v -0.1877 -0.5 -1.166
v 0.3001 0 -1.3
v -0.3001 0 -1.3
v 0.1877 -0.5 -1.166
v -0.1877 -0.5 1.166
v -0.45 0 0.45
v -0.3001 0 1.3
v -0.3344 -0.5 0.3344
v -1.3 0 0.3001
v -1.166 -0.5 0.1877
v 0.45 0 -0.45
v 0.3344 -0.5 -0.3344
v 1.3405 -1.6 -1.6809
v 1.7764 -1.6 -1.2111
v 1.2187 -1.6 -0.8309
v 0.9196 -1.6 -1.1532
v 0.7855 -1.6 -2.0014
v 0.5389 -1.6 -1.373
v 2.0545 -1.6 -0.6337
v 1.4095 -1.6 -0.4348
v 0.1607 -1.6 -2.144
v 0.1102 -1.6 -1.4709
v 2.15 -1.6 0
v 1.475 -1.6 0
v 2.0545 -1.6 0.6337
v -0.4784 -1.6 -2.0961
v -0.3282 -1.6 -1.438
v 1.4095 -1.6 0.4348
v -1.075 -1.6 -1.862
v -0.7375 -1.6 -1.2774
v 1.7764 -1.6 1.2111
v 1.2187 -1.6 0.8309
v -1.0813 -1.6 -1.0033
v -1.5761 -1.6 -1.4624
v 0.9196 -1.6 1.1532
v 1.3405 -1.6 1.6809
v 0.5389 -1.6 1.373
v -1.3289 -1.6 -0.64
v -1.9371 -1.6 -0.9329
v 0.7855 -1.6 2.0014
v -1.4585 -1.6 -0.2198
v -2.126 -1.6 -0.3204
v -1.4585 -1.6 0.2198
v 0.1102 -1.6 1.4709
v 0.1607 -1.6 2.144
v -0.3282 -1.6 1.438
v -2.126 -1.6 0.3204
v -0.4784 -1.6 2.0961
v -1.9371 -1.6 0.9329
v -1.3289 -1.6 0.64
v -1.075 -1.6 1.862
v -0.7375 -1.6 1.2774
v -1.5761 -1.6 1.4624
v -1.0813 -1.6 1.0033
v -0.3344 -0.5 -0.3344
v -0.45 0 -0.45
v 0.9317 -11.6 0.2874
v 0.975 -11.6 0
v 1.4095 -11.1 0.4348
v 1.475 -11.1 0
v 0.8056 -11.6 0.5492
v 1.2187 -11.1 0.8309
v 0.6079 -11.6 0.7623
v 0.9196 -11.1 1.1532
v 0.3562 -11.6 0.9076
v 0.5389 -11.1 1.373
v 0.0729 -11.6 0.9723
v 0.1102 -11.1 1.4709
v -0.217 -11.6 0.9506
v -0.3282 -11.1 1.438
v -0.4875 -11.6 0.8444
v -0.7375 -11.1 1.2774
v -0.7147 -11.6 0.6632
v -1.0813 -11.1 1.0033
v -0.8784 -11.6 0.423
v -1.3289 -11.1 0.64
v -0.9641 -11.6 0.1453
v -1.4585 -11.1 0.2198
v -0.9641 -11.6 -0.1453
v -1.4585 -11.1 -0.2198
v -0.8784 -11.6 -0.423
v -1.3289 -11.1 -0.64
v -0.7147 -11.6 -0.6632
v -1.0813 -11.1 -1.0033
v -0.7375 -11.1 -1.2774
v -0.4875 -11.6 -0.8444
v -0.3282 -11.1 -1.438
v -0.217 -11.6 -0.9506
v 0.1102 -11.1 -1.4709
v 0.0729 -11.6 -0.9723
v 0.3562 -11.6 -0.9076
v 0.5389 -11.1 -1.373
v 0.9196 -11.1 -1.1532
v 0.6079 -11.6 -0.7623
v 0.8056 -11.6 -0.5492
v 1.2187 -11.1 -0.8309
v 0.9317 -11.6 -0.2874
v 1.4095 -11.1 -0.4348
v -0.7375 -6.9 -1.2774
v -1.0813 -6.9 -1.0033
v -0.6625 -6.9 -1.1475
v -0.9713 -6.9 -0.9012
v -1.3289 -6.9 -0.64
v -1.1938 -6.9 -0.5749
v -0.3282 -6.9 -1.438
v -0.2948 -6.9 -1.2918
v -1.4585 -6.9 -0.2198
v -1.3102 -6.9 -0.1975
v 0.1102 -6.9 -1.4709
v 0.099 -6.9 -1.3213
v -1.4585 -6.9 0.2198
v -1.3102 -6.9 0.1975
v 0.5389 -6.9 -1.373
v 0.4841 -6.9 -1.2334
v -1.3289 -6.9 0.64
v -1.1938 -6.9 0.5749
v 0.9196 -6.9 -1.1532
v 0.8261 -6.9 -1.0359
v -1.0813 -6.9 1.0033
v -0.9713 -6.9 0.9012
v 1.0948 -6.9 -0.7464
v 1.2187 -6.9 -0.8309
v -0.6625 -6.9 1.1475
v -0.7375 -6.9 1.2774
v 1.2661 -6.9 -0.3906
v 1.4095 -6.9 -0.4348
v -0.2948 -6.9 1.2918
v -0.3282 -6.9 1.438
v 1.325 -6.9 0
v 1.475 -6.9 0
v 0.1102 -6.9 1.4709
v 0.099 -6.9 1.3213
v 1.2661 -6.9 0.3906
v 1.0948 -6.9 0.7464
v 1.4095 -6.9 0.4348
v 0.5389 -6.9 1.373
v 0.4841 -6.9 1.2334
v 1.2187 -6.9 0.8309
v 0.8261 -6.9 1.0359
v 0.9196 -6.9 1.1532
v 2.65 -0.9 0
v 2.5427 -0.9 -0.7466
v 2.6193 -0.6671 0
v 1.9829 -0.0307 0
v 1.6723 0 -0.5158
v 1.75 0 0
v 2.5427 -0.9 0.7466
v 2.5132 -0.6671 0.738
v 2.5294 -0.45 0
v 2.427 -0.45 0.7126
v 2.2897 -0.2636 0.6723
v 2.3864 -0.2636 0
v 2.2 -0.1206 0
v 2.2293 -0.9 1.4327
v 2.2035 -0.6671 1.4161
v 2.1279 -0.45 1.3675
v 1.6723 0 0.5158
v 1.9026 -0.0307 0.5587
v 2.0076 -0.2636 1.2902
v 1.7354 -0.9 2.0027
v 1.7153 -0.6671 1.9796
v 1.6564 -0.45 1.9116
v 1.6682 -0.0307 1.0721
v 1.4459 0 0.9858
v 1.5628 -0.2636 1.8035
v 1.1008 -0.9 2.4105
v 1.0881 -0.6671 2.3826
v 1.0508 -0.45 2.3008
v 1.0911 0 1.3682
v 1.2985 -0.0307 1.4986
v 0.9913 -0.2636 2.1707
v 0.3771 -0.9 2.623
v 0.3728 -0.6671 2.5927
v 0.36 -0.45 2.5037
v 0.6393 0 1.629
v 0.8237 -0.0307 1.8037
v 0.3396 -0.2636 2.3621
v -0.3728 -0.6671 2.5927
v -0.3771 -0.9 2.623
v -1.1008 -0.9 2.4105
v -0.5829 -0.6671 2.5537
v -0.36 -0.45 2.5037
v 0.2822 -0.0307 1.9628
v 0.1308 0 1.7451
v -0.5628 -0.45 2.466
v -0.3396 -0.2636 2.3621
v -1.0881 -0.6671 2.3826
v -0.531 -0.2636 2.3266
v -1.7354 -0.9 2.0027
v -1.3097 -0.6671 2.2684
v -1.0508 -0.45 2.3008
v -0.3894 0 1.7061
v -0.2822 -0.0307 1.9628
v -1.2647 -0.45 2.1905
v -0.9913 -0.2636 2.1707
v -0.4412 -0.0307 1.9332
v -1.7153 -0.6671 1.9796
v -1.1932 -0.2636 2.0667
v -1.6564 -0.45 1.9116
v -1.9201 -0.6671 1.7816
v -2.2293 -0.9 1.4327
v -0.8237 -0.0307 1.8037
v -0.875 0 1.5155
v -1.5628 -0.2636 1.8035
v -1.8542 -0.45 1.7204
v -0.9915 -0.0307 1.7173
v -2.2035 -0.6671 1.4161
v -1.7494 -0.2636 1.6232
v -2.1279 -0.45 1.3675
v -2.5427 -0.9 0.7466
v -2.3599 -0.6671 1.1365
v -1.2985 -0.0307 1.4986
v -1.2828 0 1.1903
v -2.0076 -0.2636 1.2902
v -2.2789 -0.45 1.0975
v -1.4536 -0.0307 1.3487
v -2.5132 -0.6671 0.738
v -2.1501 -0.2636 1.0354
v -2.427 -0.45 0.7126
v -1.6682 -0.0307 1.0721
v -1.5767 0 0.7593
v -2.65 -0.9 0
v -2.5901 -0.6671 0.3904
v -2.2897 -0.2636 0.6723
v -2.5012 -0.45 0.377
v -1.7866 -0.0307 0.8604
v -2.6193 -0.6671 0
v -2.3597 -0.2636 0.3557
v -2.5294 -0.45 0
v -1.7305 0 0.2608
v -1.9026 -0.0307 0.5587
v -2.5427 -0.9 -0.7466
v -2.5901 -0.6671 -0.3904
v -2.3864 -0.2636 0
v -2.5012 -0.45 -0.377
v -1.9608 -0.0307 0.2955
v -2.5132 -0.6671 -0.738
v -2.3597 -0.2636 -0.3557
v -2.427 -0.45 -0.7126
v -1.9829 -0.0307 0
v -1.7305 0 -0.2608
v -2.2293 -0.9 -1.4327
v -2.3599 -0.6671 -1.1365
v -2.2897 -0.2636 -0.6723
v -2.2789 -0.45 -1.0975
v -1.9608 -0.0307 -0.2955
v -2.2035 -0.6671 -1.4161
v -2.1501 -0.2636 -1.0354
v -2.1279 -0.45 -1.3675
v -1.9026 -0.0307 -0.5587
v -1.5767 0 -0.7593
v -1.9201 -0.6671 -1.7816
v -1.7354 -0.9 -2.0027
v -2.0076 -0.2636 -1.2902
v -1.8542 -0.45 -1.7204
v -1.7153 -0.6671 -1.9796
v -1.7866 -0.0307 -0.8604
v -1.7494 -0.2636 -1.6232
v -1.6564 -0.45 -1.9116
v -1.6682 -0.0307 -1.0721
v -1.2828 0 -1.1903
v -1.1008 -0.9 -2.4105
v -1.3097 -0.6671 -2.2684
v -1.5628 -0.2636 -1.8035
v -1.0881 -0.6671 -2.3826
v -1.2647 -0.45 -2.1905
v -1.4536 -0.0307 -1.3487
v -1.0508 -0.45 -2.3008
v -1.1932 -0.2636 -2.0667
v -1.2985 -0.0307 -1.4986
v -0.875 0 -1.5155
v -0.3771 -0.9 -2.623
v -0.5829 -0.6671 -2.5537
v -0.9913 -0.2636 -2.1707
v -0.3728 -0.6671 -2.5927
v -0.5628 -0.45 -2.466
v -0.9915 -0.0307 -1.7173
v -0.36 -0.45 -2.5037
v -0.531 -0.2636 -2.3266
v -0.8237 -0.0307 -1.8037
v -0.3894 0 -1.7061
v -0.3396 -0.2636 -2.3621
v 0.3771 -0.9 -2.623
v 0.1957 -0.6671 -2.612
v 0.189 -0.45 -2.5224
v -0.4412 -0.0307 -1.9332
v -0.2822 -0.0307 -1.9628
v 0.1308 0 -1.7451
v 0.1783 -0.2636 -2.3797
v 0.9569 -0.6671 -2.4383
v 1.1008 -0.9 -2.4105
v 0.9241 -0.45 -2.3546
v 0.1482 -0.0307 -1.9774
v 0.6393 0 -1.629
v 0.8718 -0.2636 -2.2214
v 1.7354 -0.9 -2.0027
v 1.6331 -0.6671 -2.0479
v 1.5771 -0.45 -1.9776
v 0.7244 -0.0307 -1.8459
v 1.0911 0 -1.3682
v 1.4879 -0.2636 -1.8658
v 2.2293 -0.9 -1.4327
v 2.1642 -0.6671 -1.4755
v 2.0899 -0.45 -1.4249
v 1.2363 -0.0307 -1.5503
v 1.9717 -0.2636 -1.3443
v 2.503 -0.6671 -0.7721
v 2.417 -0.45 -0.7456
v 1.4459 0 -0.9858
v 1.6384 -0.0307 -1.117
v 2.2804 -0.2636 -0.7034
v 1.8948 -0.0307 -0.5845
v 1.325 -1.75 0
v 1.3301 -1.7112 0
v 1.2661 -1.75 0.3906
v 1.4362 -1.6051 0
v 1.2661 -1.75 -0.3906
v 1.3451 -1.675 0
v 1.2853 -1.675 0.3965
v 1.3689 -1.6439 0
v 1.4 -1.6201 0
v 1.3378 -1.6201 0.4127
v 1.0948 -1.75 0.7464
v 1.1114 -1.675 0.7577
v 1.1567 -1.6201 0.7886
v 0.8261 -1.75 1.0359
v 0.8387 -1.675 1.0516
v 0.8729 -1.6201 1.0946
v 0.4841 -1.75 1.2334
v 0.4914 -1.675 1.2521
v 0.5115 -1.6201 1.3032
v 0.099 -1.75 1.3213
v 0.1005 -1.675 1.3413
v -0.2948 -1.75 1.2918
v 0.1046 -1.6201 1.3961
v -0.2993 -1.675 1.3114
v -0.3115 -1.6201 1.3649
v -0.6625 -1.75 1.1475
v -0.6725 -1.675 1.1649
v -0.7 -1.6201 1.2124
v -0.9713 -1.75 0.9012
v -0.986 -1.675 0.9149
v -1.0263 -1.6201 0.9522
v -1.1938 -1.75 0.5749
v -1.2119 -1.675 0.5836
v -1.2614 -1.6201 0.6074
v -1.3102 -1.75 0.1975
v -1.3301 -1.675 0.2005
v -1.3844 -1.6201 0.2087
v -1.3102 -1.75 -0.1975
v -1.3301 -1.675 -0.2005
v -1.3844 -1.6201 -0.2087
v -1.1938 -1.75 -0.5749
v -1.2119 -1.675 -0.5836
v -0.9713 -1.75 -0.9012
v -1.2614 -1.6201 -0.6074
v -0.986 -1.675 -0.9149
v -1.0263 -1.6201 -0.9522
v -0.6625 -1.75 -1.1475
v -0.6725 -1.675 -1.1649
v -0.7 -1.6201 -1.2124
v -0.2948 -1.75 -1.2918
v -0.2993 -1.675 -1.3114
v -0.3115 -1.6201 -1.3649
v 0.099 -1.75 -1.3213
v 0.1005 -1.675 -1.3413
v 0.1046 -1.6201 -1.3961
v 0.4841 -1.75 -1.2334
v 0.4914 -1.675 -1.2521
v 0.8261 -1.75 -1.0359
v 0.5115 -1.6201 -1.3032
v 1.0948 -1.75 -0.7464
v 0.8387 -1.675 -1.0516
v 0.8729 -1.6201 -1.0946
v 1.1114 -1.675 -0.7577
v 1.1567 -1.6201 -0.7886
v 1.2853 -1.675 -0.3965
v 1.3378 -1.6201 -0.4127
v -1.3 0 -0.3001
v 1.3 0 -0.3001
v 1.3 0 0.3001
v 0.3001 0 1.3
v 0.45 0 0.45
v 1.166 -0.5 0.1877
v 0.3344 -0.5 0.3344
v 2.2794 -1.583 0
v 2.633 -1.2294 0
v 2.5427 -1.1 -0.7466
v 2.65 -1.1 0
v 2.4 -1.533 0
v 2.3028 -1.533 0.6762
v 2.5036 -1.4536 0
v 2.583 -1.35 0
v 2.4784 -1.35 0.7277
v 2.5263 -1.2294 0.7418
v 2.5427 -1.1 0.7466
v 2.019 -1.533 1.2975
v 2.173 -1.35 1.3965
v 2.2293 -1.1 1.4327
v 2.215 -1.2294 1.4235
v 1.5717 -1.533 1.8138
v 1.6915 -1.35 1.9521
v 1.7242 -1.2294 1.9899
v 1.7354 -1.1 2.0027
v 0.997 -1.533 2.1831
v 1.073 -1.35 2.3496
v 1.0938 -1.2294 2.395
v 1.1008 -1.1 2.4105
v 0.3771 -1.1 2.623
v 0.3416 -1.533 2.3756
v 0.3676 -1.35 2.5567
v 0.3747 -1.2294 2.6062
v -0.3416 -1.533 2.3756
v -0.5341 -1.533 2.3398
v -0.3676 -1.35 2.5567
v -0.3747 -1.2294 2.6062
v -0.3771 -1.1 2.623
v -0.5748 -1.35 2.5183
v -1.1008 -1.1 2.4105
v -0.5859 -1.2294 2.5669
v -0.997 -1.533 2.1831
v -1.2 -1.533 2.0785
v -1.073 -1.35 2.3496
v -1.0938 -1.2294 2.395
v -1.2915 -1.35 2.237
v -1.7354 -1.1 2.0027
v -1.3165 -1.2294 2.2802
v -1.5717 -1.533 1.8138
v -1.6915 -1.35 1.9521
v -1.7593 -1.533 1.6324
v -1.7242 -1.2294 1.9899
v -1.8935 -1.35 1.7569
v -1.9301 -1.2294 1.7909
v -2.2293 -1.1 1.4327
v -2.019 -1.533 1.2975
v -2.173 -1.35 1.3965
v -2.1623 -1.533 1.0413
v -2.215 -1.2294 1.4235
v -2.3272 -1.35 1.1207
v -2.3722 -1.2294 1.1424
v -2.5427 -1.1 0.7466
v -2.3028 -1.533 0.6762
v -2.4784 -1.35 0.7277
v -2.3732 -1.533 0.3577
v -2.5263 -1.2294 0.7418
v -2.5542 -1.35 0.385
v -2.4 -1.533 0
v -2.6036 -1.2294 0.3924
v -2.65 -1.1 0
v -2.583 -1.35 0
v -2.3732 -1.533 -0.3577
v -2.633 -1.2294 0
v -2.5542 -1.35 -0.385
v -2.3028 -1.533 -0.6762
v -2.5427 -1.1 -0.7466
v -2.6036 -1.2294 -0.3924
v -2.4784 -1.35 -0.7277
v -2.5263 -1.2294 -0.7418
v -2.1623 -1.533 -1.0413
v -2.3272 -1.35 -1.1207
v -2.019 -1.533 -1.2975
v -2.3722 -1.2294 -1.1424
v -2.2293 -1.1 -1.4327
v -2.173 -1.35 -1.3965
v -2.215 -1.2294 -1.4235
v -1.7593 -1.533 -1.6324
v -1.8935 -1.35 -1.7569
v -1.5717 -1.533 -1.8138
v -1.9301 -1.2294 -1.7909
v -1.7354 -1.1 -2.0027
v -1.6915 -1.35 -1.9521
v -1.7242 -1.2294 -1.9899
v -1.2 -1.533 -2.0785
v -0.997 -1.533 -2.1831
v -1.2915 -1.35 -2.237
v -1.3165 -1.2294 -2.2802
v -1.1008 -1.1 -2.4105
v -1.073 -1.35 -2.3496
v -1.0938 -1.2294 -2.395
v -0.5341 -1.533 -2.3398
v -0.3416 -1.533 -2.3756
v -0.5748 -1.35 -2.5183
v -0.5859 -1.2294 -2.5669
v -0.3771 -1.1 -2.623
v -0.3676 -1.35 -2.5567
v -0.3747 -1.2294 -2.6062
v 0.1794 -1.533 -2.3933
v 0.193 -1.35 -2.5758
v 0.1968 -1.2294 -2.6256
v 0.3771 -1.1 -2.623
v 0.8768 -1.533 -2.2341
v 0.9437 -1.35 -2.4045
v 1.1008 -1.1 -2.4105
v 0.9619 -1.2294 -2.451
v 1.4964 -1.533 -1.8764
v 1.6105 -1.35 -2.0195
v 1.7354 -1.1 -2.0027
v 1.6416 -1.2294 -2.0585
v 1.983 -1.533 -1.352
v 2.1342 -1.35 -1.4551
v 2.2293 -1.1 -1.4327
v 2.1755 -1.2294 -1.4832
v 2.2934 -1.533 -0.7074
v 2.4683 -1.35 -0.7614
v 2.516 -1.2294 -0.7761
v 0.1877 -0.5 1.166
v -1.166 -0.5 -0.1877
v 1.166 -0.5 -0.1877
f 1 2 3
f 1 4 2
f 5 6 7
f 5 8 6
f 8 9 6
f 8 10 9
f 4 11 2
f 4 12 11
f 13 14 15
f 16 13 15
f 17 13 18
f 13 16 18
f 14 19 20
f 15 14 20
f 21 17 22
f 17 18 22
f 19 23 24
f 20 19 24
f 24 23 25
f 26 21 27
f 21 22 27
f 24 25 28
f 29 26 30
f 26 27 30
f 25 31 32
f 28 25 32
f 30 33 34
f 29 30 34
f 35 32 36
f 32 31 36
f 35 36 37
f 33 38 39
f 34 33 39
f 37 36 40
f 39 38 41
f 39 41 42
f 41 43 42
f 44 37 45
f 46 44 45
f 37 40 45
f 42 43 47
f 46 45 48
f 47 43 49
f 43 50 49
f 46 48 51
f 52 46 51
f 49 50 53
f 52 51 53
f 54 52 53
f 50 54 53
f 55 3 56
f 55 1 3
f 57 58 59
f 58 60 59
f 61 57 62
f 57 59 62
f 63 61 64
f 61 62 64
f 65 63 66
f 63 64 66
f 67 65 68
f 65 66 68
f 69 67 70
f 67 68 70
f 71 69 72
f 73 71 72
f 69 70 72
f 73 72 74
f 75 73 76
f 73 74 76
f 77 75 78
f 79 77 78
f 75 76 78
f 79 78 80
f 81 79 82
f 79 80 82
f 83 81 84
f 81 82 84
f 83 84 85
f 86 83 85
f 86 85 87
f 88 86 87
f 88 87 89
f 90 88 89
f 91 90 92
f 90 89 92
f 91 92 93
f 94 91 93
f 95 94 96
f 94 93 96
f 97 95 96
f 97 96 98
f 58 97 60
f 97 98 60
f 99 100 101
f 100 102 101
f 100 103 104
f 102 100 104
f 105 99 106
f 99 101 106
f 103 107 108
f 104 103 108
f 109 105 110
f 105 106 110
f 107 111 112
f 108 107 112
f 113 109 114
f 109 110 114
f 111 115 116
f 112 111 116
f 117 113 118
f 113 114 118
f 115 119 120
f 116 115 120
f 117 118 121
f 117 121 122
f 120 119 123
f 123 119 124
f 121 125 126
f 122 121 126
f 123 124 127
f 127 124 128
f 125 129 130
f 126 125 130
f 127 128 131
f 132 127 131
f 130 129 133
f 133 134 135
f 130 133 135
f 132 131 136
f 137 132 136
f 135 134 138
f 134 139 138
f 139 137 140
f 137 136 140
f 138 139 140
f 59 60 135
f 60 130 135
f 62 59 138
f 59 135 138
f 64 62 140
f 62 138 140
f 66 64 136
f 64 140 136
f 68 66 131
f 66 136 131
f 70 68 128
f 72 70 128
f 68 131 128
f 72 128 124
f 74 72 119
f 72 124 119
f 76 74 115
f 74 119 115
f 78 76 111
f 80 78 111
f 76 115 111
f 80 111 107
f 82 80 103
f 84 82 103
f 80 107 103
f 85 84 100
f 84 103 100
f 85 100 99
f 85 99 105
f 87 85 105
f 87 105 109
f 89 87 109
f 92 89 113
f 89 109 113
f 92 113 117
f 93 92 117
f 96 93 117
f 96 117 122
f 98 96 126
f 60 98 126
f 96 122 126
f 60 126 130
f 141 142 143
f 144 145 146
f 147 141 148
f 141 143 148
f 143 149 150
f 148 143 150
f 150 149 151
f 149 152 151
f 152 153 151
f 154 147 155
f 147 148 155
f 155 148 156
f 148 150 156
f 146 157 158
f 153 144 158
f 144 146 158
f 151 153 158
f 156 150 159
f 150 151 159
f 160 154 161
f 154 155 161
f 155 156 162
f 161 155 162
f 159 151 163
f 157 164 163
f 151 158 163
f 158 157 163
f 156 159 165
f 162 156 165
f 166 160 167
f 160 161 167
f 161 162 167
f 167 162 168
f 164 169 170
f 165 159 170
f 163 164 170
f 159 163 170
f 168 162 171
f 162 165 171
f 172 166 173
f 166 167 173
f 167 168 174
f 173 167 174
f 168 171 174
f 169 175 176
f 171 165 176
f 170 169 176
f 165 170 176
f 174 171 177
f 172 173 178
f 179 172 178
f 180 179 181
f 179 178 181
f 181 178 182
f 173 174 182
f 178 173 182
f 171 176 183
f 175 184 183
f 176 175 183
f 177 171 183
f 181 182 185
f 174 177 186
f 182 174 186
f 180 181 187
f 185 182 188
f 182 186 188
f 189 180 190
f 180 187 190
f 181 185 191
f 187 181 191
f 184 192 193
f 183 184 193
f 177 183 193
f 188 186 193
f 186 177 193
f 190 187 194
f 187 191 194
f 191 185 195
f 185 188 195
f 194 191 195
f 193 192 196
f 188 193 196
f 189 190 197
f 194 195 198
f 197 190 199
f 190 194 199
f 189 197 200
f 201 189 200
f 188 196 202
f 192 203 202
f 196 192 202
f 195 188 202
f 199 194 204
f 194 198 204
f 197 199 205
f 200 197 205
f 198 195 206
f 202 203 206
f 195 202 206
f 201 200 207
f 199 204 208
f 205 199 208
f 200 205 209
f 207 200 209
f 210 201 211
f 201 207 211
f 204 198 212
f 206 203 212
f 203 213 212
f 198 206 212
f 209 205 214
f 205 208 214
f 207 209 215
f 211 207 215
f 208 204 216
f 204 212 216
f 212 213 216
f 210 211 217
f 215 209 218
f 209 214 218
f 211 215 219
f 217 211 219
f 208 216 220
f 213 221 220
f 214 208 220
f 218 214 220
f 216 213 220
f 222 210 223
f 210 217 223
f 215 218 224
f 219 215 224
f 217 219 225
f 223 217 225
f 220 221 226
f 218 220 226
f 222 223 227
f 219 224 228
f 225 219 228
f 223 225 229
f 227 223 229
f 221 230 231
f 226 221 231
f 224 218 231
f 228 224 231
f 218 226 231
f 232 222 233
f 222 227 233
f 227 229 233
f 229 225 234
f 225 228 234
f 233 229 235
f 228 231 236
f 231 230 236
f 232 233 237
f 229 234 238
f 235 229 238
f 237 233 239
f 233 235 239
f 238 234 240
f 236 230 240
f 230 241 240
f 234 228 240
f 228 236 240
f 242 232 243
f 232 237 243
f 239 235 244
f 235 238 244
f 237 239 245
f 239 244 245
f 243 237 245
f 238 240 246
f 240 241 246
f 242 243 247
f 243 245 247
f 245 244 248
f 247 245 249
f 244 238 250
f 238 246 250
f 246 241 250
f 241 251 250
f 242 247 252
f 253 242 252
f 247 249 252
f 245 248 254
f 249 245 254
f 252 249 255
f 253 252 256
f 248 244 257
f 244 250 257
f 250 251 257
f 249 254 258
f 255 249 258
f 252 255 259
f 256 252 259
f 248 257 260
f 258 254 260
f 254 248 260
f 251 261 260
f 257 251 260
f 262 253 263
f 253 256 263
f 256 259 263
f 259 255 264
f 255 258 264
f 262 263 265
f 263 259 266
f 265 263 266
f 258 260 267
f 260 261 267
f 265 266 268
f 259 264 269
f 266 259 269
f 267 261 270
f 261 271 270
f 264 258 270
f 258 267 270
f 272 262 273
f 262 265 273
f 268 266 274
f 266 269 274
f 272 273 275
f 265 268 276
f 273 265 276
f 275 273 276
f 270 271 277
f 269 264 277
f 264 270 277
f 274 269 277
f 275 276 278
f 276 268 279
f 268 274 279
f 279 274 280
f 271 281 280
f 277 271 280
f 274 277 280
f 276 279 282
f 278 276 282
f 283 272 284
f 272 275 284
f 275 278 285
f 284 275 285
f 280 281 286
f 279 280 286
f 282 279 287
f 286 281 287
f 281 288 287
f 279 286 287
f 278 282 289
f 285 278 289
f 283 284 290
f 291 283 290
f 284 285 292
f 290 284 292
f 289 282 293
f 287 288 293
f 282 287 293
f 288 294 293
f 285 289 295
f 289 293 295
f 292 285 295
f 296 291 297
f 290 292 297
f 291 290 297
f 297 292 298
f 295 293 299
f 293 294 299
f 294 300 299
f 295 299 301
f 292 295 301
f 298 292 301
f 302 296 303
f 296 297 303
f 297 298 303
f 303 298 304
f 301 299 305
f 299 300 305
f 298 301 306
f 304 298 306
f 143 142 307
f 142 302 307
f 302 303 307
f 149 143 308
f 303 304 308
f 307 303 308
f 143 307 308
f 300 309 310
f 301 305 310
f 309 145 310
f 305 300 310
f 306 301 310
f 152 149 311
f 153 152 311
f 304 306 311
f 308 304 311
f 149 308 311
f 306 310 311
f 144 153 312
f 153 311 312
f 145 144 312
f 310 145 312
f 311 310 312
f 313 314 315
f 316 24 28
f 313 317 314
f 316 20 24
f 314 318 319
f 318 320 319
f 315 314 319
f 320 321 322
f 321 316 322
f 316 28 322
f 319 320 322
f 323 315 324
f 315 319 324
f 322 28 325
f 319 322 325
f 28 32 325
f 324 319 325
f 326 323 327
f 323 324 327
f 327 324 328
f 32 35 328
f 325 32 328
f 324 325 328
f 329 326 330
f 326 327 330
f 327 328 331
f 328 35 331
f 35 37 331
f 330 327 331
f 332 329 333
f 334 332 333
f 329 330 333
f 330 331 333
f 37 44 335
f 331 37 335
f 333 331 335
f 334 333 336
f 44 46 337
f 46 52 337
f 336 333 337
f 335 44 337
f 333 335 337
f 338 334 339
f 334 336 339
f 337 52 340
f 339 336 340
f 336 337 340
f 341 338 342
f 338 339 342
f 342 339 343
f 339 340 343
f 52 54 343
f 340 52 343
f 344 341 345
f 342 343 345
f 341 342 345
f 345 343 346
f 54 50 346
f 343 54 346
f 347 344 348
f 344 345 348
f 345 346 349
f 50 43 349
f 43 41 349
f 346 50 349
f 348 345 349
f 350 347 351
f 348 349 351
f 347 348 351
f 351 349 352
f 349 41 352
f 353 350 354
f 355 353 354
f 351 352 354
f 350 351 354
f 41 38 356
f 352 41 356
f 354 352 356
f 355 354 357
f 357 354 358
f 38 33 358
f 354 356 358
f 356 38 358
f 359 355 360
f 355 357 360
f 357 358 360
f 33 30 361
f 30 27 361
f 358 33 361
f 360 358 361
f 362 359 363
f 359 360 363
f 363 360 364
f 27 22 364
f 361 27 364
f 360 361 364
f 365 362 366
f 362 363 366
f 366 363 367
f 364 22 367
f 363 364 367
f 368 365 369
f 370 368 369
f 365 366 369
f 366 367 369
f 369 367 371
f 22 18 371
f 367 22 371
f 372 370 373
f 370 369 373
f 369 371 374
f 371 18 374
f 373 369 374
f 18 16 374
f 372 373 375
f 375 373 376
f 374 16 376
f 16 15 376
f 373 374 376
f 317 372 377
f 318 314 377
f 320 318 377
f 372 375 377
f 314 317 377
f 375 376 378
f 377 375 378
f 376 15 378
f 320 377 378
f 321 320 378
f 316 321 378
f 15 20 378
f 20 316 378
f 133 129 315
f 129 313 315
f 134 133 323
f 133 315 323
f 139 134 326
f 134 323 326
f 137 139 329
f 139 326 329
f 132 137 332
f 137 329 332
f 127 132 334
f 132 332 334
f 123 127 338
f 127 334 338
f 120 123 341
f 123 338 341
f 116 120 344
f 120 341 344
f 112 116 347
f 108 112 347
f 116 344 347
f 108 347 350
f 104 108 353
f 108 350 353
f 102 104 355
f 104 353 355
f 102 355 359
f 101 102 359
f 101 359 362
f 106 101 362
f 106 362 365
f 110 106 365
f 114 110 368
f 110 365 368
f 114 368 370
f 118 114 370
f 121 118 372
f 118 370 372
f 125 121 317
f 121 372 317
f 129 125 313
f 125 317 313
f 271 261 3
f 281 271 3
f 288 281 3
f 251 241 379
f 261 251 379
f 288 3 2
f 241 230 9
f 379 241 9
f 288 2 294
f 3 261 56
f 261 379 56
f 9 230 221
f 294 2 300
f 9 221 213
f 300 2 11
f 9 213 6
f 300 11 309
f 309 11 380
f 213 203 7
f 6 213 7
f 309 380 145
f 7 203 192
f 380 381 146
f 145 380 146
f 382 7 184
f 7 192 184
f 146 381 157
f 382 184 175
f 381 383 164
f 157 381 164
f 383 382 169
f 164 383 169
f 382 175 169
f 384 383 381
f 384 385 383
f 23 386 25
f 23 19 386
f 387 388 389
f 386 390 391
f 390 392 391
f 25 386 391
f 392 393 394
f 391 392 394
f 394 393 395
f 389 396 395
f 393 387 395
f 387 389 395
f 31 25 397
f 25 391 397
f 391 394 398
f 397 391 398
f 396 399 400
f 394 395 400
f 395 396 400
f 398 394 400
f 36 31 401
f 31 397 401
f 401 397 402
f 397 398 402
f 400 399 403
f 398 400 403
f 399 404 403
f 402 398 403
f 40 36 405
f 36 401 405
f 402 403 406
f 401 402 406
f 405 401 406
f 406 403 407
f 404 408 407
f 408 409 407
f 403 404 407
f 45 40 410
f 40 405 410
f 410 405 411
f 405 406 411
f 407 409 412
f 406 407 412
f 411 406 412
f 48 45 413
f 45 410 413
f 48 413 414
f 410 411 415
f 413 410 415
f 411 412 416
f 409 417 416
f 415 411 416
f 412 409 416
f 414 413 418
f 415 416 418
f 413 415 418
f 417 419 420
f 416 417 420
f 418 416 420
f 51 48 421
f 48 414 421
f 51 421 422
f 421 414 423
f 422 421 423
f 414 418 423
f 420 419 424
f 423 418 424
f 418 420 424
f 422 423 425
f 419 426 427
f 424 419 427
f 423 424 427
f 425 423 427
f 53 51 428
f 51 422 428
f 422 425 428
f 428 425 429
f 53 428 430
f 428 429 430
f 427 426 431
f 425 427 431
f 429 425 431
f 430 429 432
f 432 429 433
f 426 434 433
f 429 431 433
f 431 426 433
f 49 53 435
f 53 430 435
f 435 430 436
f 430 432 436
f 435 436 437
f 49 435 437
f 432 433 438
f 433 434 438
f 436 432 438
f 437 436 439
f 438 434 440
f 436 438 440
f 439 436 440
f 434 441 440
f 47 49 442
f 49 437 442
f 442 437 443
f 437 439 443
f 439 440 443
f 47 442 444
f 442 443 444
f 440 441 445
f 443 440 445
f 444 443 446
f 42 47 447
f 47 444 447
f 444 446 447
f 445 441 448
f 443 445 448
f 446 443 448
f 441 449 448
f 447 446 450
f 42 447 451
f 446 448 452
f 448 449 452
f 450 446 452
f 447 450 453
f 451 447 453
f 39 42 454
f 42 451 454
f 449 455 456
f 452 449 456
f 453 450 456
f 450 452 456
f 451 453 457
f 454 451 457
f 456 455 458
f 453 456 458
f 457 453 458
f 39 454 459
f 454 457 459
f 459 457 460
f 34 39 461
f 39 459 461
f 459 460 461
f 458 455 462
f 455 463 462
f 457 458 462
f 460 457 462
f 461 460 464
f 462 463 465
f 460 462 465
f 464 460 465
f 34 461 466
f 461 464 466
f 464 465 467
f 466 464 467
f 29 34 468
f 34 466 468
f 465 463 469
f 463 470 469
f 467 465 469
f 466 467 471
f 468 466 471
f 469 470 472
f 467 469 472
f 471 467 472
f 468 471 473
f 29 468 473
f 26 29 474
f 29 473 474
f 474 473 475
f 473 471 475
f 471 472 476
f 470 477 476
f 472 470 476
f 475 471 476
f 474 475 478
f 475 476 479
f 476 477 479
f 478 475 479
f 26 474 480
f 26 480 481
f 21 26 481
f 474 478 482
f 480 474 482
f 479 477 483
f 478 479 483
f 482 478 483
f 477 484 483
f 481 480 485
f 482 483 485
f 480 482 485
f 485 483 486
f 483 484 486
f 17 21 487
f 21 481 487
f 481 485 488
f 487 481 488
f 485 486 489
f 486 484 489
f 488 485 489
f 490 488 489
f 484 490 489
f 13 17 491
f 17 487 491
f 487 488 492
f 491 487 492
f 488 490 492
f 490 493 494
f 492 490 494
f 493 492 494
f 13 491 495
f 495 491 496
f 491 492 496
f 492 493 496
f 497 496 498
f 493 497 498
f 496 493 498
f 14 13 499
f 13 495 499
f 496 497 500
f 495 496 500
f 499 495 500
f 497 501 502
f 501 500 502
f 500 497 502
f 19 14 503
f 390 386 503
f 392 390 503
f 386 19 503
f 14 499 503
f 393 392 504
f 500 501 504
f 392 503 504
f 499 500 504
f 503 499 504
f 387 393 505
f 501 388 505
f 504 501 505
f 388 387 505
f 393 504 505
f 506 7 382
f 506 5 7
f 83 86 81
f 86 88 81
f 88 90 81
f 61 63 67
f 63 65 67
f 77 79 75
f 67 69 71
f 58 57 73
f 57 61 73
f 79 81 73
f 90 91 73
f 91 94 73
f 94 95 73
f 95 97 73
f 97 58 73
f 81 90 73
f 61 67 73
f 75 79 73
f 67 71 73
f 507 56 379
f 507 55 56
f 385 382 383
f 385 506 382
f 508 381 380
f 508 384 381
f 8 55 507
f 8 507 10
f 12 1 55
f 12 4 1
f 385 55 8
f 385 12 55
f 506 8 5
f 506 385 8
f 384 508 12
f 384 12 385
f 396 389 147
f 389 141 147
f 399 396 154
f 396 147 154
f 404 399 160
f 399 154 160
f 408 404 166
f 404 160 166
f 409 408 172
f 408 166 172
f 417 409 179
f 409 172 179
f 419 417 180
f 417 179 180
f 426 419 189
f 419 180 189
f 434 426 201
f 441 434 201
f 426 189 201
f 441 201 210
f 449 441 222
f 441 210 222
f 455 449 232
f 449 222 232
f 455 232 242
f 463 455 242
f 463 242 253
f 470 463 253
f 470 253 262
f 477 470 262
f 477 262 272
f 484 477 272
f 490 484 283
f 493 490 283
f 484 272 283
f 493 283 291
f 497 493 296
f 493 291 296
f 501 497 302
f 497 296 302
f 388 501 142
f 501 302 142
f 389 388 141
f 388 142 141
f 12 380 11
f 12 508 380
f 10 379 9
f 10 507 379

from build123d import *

# Parameters (mm, degrees)
CUT_EXTRUDE1_DEPTH = 0.5
CUT_EXTRUDE1_TAPER = 15


with BuildPart() as part:
    # Sketch1 → Revolve1 (revolve)
    with BuildSketch(Plane.XY):
        with BuildLine():
            Line((0, -11.6), (0.975, -11.6))
            Line((0.975, -11.6), (1.475, -11.1))
            Line((1.475, -11.1), (1.475, -6.9))
            Line((1.475, -6.9), (1.325, -6.9))
            Line((1.325, -6.9), (1.325, -1.75))
            ThreePointArc((1.325, -1.75), (1.368933983, -1.643933983), (1.475, -1.6))
            Line((1.475, -1.6), (2.15, -1.6))
            ThreePointArc((2.15, -1.6), (2.503553391, -1.453553391), (2.65, -1.1))
            Line((2.65, -1.1), (2.65, -0.9))
            ThreePointArc((2.65, -0.9), (2.386396103, -0.263603897), (1.75, 0))
            Line((1.75, 0), (0, 0))
            Line((0, 0), (0, -11.6))
        make_face()
    revolve(axis=Axis((0, 0, 0), (0, -1, 0)))

    # Sketch2 → Cut-Extrude1 (cut)
    with BuildSketch(Plane(origin=(0, 0, 0), x_dir=(1, 0, 0), z_dir=(0, 1, 0))):
        Polygon((-0.300122066, 1.3), (-0.45, 0.45), (-1.3, 0.300122066), (-1.3, -0.300122066), (-0.45, -0.45), (-0.300122066, -1.3), (0.300122066, -1.3), (0.45, -0.45), (1.3, -0.300122066), (1.3, 0.300122066), (0.45, 0.45), (0.300122066, 1.3), align=None)
    extrude(amount=-CUT_EXTRUDE1_DEPTH, taper=CUT_EXTRUDE1_TAPER, mode=Mode.SUBTRACT)


solid = part.part
